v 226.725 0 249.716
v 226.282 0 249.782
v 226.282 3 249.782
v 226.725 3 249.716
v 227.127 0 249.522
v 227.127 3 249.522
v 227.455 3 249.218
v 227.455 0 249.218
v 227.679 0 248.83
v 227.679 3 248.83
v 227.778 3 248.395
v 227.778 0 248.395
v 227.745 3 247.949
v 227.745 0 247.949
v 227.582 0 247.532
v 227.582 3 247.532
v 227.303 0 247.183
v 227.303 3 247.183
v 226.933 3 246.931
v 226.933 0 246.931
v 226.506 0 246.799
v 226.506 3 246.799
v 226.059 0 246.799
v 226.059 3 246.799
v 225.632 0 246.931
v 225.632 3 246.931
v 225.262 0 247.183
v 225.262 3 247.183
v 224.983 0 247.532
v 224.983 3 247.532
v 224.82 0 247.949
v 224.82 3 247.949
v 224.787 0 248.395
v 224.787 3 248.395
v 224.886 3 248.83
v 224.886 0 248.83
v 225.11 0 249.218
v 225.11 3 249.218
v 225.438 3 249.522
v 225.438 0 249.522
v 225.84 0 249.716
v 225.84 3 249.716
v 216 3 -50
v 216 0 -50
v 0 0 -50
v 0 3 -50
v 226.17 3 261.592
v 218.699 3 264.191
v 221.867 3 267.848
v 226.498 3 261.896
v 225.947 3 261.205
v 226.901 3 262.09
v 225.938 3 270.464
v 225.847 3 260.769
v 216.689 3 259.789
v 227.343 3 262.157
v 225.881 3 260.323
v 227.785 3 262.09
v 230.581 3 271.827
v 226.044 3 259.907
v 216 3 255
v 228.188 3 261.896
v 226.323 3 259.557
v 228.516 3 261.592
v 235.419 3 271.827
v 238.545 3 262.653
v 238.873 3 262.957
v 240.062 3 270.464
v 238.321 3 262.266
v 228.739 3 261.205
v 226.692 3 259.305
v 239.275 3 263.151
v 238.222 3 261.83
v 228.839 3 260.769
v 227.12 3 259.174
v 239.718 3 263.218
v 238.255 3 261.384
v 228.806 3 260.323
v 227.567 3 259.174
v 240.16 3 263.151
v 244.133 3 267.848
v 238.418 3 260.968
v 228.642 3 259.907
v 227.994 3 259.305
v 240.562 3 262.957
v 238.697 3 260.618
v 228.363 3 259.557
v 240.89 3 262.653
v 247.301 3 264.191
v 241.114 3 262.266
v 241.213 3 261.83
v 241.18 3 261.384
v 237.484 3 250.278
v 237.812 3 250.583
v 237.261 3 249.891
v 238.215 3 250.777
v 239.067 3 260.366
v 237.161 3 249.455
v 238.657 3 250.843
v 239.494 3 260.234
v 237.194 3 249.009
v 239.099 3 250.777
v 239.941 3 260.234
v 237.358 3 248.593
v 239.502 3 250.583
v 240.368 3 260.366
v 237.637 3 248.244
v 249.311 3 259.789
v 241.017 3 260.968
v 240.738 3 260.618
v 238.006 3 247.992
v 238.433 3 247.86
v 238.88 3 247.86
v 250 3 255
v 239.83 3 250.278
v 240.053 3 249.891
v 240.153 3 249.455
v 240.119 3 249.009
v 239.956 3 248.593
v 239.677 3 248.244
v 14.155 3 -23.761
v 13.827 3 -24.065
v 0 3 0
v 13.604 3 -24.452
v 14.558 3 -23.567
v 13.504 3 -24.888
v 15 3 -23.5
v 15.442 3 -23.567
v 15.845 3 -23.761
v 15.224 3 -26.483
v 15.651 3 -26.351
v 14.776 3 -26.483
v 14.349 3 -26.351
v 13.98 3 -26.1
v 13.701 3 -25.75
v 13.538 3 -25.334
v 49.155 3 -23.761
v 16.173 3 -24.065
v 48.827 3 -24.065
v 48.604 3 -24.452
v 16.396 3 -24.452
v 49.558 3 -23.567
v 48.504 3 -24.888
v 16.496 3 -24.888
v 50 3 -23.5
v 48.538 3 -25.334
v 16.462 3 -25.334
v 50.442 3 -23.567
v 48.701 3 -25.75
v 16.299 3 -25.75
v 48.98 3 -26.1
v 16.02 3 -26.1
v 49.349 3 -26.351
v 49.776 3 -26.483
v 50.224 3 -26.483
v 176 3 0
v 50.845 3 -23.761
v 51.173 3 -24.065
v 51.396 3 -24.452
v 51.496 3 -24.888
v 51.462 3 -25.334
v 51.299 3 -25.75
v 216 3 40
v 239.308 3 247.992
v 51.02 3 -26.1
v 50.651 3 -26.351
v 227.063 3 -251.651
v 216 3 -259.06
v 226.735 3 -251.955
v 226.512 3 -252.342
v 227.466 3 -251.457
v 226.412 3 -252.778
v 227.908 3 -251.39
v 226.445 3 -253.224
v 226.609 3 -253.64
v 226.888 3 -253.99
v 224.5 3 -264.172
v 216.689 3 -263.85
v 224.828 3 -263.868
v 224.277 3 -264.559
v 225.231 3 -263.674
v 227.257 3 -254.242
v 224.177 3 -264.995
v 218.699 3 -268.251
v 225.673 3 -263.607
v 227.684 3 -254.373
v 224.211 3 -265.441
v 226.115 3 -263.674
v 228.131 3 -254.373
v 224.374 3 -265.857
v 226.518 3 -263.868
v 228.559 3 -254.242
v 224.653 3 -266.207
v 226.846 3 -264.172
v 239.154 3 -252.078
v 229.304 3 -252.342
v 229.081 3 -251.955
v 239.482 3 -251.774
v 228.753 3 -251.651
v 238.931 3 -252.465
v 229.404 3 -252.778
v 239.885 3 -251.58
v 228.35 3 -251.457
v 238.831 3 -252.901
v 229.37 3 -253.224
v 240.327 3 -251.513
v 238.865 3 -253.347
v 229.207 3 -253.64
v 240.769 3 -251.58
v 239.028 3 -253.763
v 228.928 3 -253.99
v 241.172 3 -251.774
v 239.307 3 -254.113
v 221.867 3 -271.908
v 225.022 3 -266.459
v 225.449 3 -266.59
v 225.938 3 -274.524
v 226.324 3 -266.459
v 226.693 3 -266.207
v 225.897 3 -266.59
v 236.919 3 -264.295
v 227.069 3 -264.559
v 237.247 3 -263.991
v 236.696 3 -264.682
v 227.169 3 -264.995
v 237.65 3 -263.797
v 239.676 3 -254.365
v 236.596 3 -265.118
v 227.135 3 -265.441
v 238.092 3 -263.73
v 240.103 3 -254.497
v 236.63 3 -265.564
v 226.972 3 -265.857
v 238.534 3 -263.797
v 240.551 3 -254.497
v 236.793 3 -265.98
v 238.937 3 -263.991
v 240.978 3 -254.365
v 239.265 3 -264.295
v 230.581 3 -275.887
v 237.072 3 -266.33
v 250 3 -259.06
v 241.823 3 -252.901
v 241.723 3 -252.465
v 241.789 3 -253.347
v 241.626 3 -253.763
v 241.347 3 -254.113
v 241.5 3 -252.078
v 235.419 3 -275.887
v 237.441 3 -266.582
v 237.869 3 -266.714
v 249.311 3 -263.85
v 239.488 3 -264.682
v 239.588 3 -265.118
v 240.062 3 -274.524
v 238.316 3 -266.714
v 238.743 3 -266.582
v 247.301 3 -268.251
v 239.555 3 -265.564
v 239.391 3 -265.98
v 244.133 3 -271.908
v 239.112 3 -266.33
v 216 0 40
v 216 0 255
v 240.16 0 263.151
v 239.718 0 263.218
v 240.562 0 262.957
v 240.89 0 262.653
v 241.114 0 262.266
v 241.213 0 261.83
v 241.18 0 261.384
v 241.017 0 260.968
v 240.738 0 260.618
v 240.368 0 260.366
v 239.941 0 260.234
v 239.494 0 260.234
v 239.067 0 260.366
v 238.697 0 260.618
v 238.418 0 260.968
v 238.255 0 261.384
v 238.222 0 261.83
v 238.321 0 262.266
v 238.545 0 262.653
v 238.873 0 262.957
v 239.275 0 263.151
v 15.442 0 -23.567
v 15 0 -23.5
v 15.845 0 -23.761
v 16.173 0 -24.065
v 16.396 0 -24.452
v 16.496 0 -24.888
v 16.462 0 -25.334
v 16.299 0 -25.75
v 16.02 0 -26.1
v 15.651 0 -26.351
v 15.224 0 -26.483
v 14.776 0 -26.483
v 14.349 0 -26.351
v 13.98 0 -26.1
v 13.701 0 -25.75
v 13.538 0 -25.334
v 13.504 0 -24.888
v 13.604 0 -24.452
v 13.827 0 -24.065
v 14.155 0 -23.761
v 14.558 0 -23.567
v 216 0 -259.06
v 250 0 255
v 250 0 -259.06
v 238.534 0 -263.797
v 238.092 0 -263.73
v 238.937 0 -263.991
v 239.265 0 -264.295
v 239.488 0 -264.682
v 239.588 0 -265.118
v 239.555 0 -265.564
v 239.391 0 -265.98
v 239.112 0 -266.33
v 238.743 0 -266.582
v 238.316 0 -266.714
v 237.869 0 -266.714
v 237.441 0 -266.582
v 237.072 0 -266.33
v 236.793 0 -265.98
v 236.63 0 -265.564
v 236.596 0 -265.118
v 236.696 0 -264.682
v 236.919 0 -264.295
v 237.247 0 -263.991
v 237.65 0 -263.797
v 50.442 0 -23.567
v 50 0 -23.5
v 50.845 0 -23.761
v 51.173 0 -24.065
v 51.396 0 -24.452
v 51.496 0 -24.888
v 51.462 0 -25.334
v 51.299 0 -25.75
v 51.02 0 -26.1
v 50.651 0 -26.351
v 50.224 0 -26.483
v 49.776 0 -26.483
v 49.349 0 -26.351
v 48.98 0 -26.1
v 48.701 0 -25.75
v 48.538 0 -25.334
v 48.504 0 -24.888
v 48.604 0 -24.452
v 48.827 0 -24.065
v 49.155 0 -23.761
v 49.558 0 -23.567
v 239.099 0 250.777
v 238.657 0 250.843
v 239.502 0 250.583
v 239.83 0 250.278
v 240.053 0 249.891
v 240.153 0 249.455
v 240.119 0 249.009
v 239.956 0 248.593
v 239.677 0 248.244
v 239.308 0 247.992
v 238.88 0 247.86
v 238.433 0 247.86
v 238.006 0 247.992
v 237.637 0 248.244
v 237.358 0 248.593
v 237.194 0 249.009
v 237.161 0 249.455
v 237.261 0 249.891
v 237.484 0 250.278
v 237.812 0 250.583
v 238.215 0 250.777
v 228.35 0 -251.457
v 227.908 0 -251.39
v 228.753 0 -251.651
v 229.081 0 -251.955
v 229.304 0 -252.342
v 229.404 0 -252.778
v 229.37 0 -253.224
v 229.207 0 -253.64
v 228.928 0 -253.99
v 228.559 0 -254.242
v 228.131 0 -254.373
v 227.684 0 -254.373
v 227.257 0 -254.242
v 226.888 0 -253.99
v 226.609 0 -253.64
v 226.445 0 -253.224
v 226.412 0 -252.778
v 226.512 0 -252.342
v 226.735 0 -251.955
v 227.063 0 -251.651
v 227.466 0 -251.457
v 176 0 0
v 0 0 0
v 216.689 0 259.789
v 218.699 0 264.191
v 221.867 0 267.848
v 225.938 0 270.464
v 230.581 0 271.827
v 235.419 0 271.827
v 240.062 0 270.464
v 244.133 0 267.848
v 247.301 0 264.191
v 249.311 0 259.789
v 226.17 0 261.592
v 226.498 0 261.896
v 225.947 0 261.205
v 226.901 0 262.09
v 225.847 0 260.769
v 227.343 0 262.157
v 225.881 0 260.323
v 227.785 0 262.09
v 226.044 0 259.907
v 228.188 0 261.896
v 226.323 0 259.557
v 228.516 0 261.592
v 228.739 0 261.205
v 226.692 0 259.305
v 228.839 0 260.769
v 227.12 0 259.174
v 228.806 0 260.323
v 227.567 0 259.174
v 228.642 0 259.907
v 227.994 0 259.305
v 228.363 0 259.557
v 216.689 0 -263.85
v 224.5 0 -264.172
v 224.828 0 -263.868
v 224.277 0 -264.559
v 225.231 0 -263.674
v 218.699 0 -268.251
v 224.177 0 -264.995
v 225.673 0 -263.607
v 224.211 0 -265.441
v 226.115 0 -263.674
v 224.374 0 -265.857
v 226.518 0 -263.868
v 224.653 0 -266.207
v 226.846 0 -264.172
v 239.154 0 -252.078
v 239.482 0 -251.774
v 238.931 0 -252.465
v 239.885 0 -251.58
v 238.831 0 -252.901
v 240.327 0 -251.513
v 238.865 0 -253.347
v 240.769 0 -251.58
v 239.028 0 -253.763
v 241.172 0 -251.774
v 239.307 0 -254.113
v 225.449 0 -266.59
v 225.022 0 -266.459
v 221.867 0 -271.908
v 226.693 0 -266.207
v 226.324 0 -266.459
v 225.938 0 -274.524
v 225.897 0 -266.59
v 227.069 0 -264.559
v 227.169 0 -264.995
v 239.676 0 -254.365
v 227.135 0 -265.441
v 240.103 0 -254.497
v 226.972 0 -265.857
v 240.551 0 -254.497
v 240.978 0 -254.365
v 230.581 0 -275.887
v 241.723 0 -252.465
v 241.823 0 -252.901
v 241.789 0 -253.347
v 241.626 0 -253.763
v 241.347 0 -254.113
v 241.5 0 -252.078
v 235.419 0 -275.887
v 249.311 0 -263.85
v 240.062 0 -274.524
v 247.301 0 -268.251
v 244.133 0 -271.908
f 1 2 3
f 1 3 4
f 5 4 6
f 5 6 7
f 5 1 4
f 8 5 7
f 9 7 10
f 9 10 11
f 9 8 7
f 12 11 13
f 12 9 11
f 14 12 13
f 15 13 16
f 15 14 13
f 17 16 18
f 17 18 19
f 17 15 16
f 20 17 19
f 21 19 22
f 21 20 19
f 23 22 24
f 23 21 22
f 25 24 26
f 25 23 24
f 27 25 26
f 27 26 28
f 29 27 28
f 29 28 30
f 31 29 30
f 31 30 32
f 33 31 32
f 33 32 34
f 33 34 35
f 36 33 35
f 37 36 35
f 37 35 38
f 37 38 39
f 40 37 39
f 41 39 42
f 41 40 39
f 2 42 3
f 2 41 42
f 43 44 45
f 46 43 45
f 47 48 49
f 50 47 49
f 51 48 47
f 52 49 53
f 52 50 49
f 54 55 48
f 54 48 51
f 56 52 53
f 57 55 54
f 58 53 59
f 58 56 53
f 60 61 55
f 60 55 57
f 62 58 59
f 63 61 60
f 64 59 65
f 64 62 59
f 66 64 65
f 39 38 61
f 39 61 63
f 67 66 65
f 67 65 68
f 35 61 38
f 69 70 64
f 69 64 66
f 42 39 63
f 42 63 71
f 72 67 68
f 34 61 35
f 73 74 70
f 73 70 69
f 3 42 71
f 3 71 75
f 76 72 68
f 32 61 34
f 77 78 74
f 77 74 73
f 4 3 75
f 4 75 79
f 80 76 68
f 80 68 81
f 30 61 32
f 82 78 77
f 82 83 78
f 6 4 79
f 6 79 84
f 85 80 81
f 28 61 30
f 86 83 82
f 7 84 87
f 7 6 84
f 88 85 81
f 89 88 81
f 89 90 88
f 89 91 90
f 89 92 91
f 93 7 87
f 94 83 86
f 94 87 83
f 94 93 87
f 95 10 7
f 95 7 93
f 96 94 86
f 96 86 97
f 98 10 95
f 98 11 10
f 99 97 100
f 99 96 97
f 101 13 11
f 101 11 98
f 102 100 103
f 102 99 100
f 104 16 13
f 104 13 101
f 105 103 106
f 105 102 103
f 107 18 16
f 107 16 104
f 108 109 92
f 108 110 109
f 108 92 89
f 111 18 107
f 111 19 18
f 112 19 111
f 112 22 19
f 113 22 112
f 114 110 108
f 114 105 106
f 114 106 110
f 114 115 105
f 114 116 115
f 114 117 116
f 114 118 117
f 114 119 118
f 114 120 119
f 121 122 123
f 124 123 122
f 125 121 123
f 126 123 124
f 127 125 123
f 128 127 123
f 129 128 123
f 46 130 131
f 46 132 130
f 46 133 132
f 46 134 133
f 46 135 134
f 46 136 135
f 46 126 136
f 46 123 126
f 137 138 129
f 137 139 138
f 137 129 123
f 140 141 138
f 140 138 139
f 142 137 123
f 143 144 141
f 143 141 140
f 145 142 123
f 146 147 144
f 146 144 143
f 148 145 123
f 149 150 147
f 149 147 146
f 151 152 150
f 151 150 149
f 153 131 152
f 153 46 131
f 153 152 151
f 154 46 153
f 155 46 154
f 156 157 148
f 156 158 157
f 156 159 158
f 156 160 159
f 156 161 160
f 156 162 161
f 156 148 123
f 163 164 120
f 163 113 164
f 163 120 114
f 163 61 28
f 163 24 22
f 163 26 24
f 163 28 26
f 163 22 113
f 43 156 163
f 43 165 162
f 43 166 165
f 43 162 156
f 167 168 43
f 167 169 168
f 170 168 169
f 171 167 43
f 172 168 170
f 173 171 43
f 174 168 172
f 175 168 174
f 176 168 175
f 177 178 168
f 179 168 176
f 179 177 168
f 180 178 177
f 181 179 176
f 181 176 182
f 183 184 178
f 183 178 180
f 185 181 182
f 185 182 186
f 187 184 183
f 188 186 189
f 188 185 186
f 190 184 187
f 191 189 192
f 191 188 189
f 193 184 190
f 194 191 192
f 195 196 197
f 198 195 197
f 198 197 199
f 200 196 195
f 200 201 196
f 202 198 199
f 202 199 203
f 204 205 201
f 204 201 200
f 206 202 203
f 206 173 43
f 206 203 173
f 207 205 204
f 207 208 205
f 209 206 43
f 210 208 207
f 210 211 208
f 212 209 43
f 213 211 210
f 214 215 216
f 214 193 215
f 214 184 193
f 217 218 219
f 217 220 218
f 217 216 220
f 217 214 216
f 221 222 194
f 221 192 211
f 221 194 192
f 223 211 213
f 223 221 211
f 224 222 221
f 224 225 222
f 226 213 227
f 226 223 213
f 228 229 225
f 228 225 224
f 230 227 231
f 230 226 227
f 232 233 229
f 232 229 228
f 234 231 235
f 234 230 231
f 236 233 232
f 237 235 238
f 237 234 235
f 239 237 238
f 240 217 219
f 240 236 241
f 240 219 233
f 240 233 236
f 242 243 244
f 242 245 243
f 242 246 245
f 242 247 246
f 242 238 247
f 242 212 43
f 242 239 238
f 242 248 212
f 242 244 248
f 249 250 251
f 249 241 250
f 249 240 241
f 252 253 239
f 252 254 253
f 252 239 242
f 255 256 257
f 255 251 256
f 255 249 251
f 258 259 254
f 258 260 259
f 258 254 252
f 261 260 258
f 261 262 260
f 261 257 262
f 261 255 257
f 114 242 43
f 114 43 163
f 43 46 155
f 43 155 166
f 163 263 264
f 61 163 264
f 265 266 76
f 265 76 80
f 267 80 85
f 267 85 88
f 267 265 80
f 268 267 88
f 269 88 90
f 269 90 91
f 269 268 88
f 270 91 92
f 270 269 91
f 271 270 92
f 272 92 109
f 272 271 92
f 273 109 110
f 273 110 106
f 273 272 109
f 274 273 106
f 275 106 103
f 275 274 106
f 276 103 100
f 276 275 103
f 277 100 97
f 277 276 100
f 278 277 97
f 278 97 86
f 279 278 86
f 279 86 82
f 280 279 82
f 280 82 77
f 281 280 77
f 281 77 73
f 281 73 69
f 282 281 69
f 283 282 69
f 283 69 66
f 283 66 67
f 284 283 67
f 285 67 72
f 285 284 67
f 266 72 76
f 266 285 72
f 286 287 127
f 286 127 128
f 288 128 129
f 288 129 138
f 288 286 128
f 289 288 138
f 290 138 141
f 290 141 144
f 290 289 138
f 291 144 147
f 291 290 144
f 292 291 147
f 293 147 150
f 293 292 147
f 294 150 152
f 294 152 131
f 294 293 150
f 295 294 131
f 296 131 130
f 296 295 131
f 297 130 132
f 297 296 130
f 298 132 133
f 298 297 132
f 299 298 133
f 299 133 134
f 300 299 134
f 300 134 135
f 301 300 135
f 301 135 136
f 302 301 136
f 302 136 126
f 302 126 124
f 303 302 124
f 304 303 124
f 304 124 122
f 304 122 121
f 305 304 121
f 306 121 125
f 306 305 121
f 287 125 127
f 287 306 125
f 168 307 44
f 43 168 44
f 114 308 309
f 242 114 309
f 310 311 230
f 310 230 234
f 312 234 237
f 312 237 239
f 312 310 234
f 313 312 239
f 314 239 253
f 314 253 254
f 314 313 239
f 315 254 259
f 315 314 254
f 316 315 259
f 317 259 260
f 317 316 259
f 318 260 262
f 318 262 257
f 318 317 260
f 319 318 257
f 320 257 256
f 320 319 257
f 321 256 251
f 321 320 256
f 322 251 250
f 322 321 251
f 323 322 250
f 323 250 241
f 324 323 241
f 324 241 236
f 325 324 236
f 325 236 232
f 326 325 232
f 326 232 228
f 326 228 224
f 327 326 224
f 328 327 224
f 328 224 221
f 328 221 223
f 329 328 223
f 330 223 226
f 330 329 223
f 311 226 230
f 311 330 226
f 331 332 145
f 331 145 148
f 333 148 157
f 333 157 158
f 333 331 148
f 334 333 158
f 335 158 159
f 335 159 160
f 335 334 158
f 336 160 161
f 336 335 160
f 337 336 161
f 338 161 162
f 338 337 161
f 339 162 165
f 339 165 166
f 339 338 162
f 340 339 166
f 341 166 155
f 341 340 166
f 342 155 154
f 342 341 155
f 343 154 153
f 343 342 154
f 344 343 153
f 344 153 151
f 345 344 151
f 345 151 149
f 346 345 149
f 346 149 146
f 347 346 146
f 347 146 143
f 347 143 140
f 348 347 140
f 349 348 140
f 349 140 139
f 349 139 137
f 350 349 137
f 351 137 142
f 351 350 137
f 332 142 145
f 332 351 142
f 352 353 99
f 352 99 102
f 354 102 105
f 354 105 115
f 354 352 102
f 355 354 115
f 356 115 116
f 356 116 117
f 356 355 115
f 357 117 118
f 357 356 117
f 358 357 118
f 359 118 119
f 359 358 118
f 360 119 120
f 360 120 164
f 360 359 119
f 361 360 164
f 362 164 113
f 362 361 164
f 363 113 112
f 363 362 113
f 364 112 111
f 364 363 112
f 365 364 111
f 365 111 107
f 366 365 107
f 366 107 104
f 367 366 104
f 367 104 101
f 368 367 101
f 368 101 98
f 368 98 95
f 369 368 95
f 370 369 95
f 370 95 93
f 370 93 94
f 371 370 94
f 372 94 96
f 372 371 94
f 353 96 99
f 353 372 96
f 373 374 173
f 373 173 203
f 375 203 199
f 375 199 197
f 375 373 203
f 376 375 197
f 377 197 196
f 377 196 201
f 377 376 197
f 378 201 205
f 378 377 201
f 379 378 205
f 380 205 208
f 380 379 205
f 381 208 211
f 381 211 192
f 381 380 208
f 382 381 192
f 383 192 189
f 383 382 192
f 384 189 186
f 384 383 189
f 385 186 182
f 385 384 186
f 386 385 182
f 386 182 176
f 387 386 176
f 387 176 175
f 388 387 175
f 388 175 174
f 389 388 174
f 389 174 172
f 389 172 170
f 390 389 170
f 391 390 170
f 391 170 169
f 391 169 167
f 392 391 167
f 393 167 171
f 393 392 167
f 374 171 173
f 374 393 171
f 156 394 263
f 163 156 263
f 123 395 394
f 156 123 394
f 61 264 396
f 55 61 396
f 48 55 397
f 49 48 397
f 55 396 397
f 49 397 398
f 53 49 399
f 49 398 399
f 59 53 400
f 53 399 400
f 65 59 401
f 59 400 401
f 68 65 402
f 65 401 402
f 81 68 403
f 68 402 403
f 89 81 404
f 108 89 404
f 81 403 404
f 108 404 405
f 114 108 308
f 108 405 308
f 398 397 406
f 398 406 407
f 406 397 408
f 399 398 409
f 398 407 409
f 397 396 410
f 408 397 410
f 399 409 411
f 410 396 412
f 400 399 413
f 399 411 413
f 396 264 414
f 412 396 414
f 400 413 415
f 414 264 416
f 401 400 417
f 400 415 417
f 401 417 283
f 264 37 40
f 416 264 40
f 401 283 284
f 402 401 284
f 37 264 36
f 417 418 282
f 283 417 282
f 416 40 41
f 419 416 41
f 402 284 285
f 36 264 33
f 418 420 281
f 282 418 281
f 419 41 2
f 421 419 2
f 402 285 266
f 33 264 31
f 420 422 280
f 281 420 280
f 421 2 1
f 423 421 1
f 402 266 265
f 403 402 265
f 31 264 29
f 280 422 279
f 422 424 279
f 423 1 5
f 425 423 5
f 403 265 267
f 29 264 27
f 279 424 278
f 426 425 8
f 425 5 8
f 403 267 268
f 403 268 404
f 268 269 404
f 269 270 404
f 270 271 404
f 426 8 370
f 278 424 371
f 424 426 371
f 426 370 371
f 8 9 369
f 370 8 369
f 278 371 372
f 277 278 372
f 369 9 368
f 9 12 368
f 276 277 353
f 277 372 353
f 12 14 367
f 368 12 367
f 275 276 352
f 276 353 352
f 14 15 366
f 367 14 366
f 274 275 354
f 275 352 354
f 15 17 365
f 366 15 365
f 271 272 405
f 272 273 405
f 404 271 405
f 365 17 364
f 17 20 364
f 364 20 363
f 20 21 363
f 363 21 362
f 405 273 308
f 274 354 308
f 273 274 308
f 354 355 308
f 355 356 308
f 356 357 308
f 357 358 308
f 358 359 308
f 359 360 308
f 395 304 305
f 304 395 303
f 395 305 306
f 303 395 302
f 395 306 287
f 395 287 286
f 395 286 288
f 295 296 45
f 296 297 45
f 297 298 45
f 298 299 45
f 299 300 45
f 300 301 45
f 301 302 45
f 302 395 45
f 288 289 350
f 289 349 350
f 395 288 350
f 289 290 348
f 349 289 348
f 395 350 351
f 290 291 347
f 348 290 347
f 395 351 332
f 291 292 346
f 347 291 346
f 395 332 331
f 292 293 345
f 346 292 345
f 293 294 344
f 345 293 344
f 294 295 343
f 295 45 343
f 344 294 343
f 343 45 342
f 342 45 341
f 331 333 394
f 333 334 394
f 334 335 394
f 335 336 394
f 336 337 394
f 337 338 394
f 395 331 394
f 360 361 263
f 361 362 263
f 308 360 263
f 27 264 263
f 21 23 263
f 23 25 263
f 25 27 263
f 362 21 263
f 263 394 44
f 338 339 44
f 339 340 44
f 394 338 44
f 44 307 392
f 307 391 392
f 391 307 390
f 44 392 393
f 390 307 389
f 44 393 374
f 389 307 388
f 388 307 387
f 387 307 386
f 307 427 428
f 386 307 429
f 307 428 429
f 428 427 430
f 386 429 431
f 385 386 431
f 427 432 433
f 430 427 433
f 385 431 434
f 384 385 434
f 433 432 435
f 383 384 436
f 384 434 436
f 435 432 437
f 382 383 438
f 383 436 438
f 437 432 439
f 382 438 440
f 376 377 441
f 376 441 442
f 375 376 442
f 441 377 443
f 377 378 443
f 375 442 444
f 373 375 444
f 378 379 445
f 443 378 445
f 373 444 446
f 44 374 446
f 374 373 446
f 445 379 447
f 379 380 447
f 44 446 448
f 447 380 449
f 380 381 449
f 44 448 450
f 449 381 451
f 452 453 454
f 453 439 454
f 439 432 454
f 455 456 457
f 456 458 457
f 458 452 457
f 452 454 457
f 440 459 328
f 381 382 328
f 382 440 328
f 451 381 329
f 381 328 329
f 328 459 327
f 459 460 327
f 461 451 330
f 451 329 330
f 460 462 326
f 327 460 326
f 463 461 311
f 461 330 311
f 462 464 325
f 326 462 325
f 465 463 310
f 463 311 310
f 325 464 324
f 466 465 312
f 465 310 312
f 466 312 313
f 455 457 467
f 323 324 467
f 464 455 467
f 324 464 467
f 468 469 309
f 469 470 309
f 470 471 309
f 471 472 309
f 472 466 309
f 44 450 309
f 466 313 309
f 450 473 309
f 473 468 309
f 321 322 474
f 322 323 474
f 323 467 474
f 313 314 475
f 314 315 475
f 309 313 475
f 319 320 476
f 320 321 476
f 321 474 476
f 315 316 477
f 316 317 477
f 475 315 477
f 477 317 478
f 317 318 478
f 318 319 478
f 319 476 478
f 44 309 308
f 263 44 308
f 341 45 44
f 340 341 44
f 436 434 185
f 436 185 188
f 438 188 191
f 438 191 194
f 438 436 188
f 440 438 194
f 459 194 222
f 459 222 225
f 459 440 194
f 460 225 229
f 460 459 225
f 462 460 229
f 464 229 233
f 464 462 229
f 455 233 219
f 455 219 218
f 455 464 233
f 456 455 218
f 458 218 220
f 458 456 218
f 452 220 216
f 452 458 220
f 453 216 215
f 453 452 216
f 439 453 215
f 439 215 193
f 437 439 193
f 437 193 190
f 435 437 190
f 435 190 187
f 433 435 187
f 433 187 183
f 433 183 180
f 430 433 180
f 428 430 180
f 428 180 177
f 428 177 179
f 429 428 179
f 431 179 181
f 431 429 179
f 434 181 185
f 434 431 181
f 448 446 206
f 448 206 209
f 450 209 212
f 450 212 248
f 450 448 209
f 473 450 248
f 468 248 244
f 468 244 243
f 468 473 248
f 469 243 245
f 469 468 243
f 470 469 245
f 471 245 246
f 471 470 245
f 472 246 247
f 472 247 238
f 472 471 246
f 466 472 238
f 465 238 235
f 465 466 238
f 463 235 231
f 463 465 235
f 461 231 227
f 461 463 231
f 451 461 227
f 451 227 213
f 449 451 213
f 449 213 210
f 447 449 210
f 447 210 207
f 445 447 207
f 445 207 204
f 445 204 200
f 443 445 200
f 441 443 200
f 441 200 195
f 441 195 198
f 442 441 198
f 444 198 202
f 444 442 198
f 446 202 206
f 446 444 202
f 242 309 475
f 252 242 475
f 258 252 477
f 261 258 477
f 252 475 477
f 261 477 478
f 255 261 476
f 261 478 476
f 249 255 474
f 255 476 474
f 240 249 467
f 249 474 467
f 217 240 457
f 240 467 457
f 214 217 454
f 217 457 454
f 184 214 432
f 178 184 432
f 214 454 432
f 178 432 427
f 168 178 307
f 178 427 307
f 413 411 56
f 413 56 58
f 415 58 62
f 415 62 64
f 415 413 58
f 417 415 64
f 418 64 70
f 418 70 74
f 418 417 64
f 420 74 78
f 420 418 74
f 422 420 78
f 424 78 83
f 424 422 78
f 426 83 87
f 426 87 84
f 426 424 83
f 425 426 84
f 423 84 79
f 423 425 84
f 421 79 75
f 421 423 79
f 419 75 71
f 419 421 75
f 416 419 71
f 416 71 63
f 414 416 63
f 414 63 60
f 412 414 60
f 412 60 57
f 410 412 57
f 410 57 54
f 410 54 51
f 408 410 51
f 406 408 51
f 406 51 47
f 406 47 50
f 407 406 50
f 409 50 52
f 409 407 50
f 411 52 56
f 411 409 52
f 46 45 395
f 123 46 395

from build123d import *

# Parameters (mm, degrees)
SKETCH1_R           = 1.5
BOSS_EXTRUDE1_DEPTH = 3


with BuildPart() as part:
    # Sketch1 → Boss-Extrude1 (new body)
    with BuildSketch(Plane(origin=(0, 0, 0), x_dir=(1, 0, 0), z_dir=(0, 1, 0))):
        with BuildLine():
            Line((0, 0), (176, 0))
            Line((176, 0), (216, -40))
            Line((216, -40), (216, -255))
            ThreePointArc((216, -255), (233, -272), (250, -255))
            Line((250, -255), (250, 259.060301809))
            ThreePointArc((250, 259.060301809), (233, 276.060301809), (216, 259.060301809))
            Line((216, 259.060301809), (216, 50))
            Line((216, 50), (0, 50))
            Line((0, 50), (0, 0))
        make_face()
        with Locations(Location((238.092169369, 265.230375643, 0), (0, 0, 270))):
            Circle(SKETCH1_R, mode=Mode.SUBTRACT)
        with Locations(Location((225.673037322, 265.107252935, 0), (0, 0, 270))):
            Circle(SKETCH1_R, mode=Mode.SUBTRACT)
        with Locations(Location((227.907830631, 252.890227975, 0), (0, 0, 270))):
            Circle(SKETCH1_R, mode=Mode.SUBTRACT)
        with Locations(Location((240.326962678, 253.013350683, 0), (0, 0, 270))):
            Circle(SKETCH1_R, mode=Mode.SUBTRACT)
        with Locations(Location((226.282485579, -248.282485579, 0), (0, 0, 270))):
            Circle(SKETCH1_R, mode=Mode.SUBTRACT)
        with Locations(Location((238.656854249, -249.343145751, 0), (0, 0, 270))):
            Circle(SKETCH1_R, mode=Mode.SUBTRACT)
        with Locations(Location((239.717514421, -261.717514421, 0), (0, 0, 270))):
            Circle(SKETCH1_R, mode=Mode.SUBTRACT)
        with Locations(Location((227.343145751, -260.656854249, 0), (0, 0, 270))):
            Circle(SKETCH1_R, mode=Mode.SUBTRACT)
        with Locations(Location((15, 25, 0), (0, 0, 270))):
            Circle(SKETCH1_R, mode=Mode.SUBTRACT)
        with Locations(Location((50, 25, 0), (0, 0, 270))):
            Circle(SKETCH1_R, mode=Mode.SUBTRACT)
    extrude(amount=BOSS_EXTRUDE1_DEPTH)


solid = part.part
